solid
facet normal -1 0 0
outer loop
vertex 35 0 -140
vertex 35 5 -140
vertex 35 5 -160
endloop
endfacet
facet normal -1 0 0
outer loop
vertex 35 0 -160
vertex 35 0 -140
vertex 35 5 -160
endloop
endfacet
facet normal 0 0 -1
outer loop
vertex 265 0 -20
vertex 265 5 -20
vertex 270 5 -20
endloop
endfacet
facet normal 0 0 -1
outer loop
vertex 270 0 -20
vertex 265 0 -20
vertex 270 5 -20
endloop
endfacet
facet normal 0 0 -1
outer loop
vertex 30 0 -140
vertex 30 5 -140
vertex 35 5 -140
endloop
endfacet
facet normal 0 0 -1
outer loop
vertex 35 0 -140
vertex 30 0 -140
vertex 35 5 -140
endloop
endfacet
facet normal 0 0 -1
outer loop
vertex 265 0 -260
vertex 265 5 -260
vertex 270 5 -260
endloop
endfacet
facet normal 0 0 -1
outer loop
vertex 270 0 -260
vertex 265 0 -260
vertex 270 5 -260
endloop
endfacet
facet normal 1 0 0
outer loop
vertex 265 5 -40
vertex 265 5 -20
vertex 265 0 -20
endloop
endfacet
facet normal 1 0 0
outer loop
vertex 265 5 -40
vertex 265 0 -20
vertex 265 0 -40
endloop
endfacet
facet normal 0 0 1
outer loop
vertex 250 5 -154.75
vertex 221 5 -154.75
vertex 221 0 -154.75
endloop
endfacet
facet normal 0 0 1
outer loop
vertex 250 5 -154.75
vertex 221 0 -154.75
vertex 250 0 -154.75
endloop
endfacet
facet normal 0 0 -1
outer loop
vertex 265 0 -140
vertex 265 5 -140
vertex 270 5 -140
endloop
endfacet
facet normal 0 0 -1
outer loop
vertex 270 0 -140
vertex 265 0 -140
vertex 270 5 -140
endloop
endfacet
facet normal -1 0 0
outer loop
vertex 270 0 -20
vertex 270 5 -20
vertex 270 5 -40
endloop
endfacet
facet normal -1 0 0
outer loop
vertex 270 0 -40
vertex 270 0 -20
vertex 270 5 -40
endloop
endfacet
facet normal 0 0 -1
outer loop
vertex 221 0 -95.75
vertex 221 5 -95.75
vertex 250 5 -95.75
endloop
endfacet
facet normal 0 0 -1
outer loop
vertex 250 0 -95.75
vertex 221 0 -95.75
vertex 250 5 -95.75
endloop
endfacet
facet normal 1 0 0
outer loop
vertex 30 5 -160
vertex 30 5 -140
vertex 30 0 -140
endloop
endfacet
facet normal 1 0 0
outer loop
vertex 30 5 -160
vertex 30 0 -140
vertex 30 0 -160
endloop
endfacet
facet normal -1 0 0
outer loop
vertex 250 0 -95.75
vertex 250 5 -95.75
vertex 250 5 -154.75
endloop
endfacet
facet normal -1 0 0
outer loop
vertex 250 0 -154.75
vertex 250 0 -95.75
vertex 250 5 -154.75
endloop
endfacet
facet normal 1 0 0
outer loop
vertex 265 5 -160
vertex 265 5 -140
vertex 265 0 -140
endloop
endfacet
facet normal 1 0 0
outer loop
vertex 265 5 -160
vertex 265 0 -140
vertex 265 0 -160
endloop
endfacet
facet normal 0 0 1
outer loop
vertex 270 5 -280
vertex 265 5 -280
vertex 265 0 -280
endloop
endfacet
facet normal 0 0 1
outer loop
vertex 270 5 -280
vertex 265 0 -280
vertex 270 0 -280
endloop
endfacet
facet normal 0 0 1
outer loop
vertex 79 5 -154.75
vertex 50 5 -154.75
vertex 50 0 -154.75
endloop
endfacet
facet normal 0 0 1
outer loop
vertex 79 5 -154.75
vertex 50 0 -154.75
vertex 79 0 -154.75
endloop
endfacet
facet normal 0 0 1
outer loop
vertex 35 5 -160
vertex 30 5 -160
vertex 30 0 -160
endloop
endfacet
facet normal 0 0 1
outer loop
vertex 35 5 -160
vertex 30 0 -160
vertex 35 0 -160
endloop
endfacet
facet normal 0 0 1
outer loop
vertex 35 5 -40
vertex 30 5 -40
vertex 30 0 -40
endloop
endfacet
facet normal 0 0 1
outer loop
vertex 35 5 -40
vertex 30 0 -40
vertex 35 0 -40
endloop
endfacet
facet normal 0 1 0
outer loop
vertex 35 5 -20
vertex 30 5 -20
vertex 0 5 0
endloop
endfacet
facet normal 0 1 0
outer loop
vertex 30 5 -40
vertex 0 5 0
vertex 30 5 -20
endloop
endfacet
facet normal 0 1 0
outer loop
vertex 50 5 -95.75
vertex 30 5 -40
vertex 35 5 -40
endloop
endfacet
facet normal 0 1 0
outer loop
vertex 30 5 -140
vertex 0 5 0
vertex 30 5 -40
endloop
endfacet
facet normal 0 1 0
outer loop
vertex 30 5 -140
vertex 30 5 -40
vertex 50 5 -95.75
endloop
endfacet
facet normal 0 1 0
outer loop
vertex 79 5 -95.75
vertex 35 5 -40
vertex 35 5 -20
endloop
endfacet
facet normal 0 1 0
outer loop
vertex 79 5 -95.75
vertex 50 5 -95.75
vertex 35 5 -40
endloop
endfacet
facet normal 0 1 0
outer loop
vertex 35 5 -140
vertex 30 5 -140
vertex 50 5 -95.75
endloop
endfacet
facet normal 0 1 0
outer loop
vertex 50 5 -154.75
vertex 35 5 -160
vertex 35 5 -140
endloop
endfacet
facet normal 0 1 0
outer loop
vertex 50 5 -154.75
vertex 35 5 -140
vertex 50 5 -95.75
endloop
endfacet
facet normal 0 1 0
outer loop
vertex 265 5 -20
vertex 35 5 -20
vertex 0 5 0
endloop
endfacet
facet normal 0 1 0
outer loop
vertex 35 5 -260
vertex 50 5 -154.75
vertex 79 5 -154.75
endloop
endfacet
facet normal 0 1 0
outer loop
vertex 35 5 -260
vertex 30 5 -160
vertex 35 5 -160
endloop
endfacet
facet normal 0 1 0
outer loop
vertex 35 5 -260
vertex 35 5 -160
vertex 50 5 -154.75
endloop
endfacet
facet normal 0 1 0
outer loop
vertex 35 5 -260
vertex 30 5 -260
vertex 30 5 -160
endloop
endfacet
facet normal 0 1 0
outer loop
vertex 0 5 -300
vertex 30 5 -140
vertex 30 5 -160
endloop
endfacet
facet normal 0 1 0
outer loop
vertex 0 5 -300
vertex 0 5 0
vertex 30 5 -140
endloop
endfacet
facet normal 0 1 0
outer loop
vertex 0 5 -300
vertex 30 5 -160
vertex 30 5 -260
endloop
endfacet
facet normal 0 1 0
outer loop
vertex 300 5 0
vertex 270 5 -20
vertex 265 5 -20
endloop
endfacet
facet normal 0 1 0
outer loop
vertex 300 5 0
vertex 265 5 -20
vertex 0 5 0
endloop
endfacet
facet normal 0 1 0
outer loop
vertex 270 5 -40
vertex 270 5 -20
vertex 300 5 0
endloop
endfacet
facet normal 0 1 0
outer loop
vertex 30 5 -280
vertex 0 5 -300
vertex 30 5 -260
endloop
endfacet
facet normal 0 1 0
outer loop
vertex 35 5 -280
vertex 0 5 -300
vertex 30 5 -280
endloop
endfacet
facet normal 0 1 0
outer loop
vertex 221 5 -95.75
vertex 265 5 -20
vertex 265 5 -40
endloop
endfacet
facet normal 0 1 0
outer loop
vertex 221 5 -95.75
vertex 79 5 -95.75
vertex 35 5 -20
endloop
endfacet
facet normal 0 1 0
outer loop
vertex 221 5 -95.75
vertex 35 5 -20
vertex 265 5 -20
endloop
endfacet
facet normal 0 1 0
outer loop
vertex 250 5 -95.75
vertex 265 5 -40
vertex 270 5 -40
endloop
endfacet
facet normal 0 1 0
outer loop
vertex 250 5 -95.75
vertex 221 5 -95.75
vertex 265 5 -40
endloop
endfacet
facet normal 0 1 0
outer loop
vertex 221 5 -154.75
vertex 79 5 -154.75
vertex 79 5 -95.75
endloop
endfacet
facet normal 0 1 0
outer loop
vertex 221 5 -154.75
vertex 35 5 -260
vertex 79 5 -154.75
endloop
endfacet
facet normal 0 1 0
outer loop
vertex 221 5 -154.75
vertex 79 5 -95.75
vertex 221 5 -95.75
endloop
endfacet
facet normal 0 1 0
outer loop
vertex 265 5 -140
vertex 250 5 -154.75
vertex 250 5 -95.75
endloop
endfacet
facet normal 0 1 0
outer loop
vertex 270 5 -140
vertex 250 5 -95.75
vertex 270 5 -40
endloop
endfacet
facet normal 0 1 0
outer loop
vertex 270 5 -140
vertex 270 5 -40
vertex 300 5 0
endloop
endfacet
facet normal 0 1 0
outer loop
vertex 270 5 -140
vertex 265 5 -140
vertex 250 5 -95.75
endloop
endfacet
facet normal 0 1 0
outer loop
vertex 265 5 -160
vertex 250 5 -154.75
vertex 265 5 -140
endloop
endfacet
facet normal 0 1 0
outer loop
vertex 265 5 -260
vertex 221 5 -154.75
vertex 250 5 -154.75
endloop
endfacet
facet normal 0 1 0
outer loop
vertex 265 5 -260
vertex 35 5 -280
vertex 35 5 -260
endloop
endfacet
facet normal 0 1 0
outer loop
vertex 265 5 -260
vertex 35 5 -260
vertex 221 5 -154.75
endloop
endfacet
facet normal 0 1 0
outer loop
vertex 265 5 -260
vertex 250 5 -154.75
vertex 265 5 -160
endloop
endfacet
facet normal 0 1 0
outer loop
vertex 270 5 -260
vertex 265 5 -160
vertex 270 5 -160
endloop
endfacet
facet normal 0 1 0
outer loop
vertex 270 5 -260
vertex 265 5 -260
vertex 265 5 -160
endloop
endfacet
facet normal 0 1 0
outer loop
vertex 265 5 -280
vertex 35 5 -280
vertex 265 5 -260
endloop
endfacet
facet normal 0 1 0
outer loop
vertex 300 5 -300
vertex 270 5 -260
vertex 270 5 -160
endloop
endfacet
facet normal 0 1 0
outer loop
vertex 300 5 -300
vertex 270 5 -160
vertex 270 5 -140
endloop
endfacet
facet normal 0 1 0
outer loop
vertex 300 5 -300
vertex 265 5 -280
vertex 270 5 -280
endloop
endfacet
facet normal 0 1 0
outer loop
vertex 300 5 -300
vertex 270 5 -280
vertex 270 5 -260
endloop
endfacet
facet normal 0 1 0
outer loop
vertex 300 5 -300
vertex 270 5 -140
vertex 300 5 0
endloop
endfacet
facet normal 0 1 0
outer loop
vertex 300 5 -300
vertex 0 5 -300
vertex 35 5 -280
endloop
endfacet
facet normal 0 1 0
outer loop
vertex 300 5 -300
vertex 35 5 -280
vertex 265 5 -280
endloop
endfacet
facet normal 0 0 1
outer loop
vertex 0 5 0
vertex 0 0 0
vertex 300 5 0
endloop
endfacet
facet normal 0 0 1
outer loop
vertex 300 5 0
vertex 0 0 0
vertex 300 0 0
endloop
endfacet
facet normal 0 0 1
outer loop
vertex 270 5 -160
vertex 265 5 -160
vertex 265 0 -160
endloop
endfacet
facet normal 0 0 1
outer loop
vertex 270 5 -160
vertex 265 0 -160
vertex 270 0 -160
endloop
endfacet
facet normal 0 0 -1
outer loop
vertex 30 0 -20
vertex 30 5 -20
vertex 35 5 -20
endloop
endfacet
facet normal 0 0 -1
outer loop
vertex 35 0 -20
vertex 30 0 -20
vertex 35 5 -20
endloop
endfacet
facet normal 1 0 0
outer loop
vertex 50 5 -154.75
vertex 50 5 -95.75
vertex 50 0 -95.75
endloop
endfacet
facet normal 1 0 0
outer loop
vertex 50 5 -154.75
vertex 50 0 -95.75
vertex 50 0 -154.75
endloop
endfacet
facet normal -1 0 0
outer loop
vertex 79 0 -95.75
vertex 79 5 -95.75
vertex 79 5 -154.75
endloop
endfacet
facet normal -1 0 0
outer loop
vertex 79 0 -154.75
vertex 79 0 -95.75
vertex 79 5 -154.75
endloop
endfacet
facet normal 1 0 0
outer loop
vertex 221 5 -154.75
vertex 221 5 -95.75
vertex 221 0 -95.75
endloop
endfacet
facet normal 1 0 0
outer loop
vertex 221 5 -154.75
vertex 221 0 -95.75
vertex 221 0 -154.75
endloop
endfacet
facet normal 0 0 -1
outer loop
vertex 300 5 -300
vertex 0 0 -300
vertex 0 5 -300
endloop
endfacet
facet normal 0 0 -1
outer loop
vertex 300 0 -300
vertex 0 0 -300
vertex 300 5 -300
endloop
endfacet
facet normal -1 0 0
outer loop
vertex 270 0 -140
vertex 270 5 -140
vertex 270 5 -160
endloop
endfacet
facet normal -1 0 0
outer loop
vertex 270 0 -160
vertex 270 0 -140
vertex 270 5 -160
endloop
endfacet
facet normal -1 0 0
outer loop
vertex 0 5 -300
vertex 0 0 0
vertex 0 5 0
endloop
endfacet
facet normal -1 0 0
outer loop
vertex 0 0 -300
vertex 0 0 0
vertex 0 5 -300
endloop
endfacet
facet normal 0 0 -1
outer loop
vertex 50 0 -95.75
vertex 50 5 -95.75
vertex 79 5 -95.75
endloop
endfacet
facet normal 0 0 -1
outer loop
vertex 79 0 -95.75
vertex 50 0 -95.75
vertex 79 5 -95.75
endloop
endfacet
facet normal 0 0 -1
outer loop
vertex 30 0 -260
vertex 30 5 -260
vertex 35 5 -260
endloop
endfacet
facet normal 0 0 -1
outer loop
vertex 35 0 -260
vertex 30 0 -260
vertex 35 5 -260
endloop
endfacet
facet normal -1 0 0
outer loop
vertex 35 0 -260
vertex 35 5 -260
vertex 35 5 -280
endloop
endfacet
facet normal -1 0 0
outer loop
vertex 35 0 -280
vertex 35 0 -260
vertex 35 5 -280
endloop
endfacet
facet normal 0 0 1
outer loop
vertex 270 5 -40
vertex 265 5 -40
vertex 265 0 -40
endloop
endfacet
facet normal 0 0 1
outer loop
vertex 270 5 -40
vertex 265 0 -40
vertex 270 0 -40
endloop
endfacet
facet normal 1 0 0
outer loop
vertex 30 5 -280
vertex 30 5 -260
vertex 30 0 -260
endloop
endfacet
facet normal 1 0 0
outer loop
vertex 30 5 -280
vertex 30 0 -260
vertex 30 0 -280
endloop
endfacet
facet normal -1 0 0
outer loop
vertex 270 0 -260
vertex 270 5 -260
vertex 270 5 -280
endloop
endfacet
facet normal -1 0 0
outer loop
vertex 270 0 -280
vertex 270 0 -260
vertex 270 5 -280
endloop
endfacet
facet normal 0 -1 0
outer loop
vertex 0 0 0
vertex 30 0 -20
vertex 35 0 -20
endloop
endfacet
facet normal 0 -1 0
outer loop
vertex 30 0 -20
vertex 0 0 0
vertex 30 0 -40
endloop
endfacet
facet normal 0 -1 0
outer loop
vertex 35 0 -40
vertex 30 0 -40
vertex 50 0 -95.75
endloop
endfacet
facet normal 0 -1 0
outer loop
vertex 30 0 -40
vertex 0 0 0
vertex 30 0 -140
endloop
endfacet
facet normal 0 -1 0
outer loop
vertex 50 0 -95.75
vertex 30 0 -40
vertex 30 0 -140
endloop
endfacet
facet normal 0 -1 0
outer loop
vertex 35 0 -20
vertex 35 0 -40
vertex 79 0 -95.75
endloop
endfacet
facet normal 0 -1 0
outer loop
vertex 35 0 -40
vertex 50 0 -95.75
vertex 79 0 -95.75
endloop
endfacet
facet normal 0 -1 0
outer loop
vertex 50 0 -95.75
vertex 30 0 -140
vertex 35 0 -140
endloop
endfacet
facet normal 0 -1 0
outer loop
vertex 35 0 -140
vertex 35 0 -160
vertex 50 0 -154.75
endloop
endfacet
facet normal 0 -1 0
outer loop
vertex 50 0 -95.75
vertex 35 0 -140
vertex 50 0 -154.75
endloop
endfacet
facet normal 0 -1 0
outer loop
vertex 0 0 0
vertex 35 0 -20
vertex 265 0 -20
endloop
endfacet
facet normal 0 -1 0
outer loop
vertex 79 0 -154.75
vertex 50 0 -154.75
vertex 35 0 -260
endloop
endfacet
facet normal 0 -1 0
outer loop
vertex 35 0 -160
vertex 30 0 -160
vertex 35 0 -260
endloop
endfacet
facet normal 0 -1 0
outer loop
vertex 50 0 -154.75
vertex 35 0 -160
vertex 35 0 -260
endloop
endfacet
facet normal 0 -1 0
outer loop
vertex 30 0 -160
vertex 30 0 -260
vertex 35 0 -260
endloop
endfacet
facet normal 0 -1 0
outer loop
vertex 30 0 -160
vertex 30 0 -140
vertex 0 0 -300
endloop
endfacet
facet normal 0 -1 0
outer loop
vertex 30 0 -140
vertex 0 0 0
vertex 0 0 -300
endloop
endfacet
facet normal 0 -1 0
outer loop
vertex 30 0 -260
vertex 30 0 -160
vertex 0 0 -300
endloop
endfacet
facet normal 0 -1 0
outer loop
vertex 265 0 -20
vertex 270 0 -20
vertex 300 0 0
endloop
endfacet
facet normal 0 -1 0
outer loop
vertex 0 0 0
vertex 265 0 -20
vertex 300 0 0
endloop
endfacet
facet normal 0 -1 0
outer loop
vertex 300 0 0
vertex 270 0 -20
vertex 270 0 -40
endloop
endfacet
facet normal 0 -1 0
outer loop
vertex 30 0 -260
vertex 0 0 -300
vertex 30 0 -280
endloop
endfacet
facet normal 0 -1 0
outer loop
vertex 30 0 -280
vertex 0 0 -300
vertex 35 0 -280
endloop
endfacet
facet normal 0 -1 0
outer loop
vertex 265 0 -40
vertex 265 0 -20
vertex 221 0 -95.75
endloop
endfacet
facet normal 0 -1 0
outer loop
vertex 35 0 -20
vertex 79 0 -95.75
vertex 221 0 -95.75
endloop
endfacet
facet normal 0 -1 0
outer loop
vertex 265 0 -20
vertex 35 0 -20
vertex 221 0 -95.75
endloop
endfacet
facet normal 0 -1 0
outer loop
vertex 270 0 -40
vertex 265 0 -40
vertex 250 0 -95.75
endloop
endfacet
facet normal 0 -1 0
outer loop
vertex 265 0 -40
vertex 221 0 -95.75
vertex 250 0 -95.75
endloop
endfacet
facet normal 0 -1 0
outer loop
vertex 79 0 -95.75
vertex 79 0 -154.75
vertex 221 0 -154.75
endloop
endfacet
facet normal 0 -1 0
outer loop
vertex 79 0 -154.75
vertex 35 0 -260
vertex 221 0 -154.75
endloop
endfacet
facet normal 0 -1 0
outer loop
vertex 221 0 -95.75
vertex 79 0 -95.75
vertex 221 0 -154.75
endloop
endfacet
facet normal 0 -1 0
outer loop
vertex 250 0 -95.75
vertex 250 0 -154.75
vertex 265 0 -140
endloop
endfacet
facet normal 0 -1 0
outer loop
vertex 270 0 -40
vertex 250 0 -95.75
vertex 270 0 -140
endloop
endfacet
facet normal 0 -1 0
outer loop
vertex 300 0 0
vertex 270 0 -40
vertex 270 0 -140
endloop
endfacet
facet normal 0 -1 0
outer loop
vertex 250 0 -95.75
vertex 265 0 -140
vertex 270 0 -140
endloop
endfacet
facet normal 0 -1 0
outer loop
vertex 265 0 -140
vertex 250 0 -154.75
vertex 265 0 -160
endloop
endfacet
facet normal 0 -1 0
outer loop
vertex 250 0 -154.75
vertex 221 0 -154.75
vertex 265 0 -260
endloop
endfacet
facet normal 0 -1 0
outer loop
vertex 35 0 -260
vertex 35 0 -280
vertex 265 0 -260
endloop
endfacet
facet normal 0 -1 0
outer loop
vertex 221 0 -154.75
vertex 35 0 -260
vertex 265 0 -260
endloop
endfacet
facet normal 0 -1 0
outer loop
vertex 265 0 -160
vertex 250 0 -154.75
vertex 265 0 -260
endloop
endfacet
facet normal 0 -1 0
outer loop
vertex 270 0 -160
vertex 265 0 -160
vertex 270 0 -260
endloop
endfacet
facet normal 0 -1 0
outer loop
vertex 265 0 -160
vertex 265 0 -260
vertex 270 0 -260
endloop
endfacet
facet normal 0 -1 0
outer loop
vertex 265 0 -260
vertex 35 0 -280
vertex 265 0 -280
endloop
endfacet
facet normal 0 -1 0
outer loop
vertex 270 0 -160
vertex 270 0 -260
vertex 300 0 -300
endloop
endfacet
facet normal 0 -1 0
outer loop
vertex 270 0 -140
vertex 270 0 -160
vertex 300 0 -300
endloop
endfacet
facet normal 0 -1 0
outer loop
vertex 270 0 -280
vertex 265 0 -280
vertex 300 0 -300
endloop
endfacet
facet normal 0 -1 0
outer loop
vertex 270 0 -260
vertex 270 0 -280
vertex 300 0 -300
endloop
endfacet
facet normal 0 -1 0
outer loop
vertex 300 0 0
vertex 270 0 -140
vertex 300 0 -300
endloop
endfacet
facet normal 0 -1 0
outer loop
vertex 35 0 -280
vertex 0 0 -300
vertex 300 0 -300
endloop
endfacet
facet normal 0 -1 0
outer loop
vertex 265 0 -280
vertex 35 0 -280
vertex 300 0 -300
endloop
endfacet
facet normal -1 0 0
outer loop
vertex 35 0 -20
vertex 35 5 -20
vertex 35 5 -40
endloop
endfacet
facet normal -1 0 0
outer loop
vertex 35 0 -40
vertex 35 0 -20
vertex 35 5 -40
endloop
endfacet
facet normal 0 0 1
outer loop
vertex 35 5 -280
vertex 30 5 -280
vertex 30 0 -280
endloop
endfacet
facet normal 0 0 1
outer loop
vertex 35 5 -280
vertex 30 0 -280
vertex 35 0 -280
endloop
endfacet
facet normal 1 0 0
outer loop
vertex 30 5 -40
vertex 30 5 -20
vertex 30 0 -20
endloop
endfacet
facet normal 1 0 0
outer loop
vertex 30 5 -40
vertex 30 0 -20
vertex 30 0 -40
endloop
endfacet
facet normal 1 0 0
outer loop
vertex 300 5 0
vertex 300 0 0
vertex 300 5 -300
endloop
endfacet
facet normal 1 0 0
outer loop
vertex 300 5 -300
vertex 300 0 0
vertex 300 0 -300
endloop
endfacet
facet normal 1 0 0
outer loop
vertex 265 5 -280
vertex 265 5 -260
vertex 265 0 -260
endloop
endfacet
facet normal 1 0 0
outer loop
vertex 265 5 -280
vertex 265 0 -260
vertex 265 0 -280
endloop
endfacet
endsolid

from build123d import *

# Parameters (mm, degrees)
SKETCH1_W           = 300
SKETCH1_H           = 300
BOSS_EXTRUDE1_DEPTH = 5
SKETCH2_W           = 29
SKETCH2_H           = 59
CUT_EXTRUDE1_DEPTH  = 5
SKETCH3_W           = 5
SKETCH3_H           = 20
CUT_EXTRUDE2_DEPTH  = 5


with BuildPart() as part:
    # Sketch1 → Boss-Extrude1 (new body)
    with BuildSketch(Plane(origin=(0, 0, 0), x_dir=(1, 0, 0), z_dir=(0, 1, 0))):
        with Locations((150, 150)):
            Rectangle(SKETCH1_W, SKETCH1_H)
    extrude(amount=BOSS_EXTRUDE1_DEPTH)

    # Sketch2 → Cut-Extrude1 (cut)
    with BuildSketch(Plane(origin=(0, 5, 0), x_dir=(1, 0, 0), z_dir=(0, 1, 0))):
        with Locations((235.5, 125.25)):
            Rectangle(SKETCH2_W, SKETCH2_H)
        with Locations((64.5, 125.25)):
            Rectangle(SKETCH2_W, SKETCH2_H)
    extrude(amount=-CUT_EXTRUDE1_DEPTH, mode=Mode.SUBTRACT)

    # Sketch3 → Cut-Extrude2 (cut)
    with BuildSketch(Plane(origin=(0, 5, 0), x_dir=(1, 0, 0), z_dir=(0, 1, 0))):
        with Locations((267.5, 30)):
            Rectangle(SKETCH3_W, SKETCH3_H)
        with Locations((267.5, 150)):
            Rectangle(SKETCH3_W, SKETCH3_H)
        with Locations((267.5, 270)):
            Rectangle(SKETCH3_W, SKETCH3_H)
        with Locations((32.5, 30)):
            Rectangle(SKETCH3_W, SKETCH3_H)
        with Locations((32.5, 150)):
            Rectangle(SKETCH3_W, SKETCH3_H)
        with Locations((32.5, 270)):
            Rectangle(SKETCH3_W, SKETCH3_H)
    extrude(amount=-CUT_EXTRUDE2_DEPTH, mode=Mode.SUBTRACT)


solid = part.part
